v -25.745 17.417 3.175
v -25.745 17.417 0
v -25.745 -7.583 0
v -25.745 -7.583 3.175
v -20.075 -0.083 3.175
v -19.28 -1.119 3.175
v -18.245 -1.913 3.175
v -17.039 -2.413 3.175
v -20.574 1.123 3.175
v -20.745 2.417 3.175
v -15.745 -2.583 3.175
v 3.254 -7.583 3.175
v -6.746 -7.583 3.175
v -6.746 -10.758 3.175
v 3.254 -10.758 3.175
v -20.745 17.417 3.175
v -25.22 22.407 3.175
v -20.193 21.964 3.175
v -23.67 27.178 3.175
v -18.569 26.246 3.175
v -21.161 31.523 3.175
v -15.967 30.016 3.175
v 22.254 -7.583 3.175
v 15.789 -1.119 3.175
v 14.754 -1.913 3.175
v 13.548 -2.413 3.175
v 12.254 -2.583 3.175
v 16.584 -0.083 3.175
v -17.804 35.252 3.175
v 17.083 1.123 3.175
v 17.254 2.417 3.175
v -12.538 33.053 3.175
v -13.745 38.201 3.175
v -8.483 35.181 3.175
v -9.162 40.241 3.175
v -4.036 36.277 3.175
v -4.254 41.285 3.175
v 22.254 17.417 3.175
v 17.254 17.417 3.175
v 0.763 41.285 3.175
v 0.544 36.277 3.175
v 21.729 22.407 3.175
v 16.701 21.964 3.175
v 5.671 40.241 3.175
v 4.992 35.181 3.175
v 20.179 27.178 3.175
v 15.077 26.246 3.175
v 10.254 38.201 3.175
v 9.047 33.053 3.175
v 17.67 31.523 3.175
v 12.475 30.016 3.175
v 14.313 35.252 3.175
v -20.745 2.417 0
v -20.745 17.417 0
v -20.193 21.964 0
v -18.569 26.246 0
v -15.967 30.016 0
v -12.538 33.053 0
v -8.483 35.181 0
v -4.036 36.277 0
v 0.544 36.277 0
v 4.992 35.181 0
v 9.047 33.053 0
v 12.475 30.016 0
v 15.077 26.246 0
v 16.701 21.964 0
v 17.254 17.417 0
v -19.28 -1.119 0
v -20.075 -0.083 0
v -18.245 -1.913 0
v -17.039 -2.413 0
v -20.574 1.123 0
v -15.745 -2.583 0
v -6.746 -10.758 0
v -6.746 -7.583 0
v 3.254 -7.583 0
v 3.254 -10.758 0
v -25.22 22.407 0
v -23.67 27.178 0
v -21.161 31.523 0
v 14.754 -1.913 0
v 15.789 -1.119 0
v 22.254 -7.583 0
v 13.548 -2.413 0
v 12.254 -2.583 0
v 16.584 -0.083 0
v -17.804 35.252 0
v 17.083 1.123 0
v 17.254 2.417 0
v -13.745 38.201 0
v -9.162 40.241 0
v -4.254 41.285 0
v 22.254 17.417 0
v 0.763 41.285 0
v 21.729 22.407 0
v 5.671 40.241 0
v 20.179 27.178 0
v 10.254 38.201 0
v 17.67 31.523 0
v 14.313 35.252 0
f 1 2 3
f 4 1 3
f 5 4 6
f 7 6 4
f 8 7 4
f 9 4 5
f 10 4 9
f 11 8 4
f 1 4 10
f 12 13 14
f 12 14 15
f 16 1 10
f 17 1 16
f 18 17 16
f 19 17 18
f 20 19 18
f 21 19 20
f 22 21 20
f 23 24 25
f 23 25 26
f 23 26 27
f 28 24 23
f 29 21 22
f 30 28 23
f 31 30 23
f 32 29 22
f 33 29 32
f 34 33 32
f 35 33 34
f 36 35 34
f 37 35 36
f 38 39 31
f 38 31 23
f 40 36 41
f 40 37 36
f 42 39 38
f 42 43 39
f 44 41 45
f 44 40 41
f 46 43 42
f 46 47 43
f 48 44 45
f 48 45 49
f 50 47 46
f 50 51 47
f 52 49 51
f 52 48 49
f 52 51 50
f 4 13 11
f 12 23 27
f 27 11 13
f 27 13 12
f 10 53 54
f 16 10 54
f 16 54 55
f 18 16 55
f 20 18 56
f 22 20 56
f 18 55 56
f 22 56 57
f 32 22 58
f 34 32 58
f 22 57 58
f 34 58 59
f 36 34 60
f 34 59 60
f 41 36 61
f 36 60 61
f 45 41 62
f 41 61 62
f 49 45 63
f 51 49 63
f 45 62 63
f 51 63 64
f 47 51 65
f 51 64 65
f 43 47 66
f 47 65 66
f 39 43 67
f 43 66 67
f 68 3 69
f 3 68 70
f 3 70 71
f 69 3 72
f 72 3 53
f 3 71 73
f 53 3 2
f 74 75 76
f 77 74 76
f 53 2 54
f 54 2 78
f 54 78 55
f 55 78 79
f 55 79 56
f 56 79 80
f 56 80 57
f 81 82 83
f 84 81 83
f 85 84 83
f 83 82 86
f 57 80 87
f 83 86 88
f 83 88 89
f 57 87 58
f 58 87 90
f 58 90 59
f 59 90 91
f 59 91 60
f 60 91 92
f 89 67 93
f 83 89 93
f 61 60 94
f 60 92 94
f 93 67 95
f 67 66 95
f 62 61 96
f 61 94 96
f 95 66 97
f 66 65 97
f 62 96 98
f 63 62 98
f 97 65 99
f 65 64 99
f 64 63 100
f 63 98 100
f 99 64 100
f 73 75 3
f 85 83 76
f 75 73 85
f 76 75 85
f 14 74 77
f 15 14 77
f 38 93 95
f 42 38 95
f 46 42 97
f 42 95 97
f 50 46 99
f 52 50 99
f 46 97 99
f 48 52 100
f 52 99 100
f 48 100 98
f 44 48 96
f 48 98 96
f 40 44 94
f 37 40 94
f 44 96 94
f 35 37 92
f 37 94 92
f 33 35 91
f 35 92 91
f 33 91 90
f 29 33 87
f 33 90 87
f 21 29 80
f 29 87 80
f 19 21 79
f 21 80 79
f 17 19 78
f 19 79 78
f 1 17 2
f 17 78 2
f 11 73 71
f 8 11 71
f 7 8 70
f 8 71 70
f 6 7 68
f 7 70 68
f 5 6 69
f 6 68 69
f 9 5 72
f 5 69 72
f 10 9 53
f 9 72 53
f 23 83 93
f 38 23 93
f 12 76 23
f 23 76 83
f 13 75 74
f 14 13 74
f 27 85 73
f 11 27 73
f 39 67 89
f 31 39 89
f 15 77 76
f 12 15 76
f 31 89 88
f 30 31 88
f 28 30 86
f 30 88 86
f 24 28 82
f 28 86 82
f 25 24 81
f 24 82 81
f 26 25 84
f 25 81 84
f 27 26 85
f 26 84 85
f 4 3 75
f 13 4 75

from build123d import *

# Parameters (mm, degrees)
F1_DEPTH = 3.175


with BuildPart() as f1:
    # F0 (on Top) → F1 (new body)
    with BuildSketch(Plane.XY):
        with BuildLine():
            Line((-25.744793, 17.416838), (-25.744793, -7.583162))
            Line((-25.744793, -7.583162), (-6.745631, -7.583162))
            Line((-6.745631, -7.583162), (-6.745631, -10.758162))
            Line((-6.745631, -10.758162), (3.254369, -10.758162))
            Line((3.254369, -10.758162), (3.254369, -7.583162))
            Line((3.254369, -7.583162), (22.253532, -7.583162))
            Line((22.253532, -7.583162), (22.253532, 17.416838))
            ThreePointArc((22.253532, 17.416838), (-1.745631, 41.416), (-25.744793, 17.416838))
        make_face()
        with BuildLine():
            ThreePointArc((-20.744793, 17.416838), (-1.745631, 36.416), (17.253532, 17.416838))
            Line((17.253532, 17.416838), (17.253532, 12.416838))
            Line((17.253532, 12.416838), (17.253532, 2.416838))
            ThreePointArc((17.253532, 2.416838), (15.789066, -1.118696), (12.253532, -2.583162))
            Line((12.253532, -2.583162), (3.254369, -2.583162))
            Line((3.254369, -2.583162), (-6.745631, -2.583162))
            Line((-6.745631, -2.583162), (-15.744793, -2.583162))
            ThreePointArc((-15.744793, -2.583162), (-19.280327, -1.118696), (-20.744793, 2.416838))
            Line((-20.744793, 2.416838), (-20.744793, 12.416838))
            Line((-20.744793, 12.416838), (-20.744793, 17.416838))
        make_face(mode=Mode.SUBTRACT)
    extrude(amount=F1_DEPTH)


solid = f1.part
